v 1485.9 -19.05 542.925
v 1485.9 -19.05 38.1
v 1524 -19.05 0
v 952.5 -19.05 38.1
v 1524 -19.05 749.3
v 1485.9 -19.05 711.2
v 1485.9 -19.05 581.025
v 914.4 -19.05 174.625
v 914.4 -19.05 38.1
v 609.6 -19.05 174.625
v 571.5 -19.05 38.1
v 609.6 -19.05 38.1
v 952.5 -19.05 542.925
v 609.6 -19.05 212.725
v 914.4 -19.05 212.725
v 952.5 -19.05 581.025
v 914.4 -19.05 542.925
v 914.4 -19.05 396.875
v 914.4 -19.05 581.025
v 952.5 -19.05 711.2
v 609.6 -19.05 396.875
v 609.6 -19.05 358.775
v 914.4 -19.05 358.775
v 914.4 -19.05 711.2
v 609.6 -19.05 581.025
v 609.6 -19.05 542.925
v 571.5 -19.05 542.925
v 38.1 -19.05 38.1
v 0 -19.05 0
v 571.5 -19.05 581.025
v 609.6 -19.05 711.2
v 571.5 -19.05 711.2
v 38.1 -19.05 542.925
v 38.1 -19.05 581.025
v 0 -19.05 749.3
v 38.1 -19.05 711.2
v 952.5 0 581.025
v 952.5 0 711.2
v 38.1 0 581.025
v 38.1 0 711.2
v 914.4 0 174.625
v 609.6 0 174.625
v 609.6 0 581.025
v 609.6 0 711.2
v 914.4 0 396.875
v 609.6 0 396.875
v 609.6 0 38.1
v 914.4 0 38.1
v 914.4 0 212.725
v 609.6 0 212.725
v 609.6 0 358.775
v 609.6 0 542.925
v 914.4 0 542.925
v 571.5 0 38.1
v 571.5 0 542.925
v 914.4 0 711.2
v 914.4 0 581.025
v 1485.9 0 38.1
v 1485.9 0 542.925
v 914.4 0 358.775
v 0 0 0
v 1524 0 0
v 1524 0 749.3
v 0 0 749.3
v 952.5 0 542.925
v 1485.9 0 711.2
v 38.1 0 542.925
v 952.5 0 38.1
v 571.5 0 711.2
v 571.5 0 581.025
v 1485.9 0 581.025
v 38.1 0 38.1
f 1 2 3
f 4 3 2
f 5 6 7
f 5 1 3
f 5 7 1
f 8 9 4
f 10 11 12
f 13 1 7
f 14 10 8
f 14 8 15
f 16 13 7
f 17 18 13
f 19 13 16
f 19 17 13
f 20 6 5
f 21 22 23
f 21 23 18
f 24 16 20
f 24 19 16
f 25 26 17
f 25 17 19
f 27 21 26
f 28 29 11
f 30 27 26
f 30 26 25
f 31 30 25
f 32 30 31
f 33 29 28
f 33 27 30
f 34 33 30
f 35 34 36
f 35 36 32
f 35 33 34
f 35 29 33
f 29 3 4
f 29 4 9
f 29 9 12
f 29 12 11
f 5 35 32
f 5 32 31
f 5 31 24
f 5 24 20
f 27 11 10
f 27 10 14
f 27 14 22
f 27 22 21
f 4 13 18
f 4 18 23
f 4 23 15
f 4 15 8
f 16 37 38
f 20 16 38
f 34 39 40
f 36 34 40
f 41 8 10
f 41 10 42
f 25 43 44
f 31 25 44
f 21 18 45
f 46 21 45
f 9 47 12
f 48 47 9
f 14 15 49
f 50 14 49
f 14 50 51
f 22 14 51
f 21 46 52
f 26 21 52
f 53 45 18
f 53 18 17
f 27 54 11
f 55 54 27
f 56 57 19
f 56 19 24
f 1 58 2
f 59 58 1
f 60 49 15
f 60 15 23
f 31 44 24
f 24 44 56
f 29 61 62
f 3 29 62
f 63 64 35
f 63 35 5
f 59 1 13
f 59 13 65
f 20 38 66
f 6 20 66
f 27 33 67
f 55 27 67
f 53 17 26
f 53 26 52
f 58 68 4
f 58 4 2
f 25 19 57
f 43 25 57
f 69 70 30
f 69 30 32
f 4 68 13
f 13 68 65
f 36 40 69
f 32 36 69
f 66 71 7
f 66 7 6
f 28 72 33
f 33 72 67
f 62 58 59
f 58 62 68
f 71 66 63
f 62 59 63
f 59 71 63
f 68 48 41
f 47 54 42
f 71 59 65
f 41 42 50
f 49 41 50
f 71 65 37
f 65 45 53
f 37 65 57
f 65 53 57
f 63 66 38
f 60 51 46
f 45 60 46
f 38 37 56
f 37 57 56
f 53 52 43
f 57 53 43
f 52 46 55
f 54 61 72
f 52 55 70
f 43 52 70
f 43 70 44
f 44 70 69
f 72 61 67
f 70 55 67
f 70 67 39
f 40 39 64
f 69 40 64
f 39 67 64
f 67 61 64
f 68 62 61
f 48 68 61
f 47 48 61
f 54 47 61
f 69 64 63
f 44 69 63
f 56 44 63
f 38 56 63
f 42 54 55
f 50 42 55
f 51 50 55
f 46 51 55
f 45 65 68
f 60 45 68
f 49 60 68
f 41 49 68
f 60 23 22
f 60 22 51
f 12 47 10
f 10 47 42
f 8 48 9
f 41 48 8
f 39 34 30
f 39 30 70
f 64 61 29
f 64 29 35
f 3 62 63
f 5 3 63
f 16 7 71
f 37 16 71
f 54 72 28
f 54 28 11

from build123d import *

# Parameters (mm, degrees)
F0_W     = 1524
F0_H     = 749.3
F0_W_2   = 533.4
F0_H_2   = 673.1
F0_W_3   = 304.8
F1_DEPTH = 19.05
F2_W     = 19.05
F2_H     = 38.1
F3_DEPTH = 1447.8
F4_W     = 19.05
F4_H     = 38.1
F5_DEPTH = 304.8
F6_W     = 19.05
F6_H     = 38.1
F7_DEPTH = 304.8


with BuildPart() as f1:
    # F0 (on Front) → F1 (new body)
    with BuildSketch(Plane.XZ):
        with Locations((762, 374.65)):
            Rectangle(F0_W, F0_H)
        with Locations((304.8, 374.65)):
            Rectangle(F0_W_2, F0_H_2, mode=Mode.SUBTRACT)
        with Locations((762, 374.65)):
            Rectangle(F0_W_3, F0_H_2, mode=Mode.SUBTRACT)
        with Locations((1219.2, 374.65)):
            Rectangle(F0_W_2, F0_H_2, mode=Mode.SUBTRACT)
    extrude(amount=F1_DEPTH)

    # F2 (on face) → F3 (join, through all)
    with BuildSketch(Plane.YZ.offset(38.1)):
        with Locations((-9.525, 561.975)):
            Rectangle(F2_W, F2_H)
    extrude(amount=F3_DEPTH)

    # F4 (on face) → F5 (join, through all)
    with BuildSketch(Plane.YZ.offset(609.6)):
        with Locations((-9.525, 377.825)):
            Rectangle(F4_W, F4_H)
    extrude(amount=F5_DEPTH)

    # F6 (on face) → F7 (join, through all)
    with BuildSketch(Plane.YZ.offset(609.6)):
        with Locations((-9.525, 193.675)):
            Rectangle(F6_W, F6_H)
    extrude(amount=F7_DEPTH)


solid = f1.part
